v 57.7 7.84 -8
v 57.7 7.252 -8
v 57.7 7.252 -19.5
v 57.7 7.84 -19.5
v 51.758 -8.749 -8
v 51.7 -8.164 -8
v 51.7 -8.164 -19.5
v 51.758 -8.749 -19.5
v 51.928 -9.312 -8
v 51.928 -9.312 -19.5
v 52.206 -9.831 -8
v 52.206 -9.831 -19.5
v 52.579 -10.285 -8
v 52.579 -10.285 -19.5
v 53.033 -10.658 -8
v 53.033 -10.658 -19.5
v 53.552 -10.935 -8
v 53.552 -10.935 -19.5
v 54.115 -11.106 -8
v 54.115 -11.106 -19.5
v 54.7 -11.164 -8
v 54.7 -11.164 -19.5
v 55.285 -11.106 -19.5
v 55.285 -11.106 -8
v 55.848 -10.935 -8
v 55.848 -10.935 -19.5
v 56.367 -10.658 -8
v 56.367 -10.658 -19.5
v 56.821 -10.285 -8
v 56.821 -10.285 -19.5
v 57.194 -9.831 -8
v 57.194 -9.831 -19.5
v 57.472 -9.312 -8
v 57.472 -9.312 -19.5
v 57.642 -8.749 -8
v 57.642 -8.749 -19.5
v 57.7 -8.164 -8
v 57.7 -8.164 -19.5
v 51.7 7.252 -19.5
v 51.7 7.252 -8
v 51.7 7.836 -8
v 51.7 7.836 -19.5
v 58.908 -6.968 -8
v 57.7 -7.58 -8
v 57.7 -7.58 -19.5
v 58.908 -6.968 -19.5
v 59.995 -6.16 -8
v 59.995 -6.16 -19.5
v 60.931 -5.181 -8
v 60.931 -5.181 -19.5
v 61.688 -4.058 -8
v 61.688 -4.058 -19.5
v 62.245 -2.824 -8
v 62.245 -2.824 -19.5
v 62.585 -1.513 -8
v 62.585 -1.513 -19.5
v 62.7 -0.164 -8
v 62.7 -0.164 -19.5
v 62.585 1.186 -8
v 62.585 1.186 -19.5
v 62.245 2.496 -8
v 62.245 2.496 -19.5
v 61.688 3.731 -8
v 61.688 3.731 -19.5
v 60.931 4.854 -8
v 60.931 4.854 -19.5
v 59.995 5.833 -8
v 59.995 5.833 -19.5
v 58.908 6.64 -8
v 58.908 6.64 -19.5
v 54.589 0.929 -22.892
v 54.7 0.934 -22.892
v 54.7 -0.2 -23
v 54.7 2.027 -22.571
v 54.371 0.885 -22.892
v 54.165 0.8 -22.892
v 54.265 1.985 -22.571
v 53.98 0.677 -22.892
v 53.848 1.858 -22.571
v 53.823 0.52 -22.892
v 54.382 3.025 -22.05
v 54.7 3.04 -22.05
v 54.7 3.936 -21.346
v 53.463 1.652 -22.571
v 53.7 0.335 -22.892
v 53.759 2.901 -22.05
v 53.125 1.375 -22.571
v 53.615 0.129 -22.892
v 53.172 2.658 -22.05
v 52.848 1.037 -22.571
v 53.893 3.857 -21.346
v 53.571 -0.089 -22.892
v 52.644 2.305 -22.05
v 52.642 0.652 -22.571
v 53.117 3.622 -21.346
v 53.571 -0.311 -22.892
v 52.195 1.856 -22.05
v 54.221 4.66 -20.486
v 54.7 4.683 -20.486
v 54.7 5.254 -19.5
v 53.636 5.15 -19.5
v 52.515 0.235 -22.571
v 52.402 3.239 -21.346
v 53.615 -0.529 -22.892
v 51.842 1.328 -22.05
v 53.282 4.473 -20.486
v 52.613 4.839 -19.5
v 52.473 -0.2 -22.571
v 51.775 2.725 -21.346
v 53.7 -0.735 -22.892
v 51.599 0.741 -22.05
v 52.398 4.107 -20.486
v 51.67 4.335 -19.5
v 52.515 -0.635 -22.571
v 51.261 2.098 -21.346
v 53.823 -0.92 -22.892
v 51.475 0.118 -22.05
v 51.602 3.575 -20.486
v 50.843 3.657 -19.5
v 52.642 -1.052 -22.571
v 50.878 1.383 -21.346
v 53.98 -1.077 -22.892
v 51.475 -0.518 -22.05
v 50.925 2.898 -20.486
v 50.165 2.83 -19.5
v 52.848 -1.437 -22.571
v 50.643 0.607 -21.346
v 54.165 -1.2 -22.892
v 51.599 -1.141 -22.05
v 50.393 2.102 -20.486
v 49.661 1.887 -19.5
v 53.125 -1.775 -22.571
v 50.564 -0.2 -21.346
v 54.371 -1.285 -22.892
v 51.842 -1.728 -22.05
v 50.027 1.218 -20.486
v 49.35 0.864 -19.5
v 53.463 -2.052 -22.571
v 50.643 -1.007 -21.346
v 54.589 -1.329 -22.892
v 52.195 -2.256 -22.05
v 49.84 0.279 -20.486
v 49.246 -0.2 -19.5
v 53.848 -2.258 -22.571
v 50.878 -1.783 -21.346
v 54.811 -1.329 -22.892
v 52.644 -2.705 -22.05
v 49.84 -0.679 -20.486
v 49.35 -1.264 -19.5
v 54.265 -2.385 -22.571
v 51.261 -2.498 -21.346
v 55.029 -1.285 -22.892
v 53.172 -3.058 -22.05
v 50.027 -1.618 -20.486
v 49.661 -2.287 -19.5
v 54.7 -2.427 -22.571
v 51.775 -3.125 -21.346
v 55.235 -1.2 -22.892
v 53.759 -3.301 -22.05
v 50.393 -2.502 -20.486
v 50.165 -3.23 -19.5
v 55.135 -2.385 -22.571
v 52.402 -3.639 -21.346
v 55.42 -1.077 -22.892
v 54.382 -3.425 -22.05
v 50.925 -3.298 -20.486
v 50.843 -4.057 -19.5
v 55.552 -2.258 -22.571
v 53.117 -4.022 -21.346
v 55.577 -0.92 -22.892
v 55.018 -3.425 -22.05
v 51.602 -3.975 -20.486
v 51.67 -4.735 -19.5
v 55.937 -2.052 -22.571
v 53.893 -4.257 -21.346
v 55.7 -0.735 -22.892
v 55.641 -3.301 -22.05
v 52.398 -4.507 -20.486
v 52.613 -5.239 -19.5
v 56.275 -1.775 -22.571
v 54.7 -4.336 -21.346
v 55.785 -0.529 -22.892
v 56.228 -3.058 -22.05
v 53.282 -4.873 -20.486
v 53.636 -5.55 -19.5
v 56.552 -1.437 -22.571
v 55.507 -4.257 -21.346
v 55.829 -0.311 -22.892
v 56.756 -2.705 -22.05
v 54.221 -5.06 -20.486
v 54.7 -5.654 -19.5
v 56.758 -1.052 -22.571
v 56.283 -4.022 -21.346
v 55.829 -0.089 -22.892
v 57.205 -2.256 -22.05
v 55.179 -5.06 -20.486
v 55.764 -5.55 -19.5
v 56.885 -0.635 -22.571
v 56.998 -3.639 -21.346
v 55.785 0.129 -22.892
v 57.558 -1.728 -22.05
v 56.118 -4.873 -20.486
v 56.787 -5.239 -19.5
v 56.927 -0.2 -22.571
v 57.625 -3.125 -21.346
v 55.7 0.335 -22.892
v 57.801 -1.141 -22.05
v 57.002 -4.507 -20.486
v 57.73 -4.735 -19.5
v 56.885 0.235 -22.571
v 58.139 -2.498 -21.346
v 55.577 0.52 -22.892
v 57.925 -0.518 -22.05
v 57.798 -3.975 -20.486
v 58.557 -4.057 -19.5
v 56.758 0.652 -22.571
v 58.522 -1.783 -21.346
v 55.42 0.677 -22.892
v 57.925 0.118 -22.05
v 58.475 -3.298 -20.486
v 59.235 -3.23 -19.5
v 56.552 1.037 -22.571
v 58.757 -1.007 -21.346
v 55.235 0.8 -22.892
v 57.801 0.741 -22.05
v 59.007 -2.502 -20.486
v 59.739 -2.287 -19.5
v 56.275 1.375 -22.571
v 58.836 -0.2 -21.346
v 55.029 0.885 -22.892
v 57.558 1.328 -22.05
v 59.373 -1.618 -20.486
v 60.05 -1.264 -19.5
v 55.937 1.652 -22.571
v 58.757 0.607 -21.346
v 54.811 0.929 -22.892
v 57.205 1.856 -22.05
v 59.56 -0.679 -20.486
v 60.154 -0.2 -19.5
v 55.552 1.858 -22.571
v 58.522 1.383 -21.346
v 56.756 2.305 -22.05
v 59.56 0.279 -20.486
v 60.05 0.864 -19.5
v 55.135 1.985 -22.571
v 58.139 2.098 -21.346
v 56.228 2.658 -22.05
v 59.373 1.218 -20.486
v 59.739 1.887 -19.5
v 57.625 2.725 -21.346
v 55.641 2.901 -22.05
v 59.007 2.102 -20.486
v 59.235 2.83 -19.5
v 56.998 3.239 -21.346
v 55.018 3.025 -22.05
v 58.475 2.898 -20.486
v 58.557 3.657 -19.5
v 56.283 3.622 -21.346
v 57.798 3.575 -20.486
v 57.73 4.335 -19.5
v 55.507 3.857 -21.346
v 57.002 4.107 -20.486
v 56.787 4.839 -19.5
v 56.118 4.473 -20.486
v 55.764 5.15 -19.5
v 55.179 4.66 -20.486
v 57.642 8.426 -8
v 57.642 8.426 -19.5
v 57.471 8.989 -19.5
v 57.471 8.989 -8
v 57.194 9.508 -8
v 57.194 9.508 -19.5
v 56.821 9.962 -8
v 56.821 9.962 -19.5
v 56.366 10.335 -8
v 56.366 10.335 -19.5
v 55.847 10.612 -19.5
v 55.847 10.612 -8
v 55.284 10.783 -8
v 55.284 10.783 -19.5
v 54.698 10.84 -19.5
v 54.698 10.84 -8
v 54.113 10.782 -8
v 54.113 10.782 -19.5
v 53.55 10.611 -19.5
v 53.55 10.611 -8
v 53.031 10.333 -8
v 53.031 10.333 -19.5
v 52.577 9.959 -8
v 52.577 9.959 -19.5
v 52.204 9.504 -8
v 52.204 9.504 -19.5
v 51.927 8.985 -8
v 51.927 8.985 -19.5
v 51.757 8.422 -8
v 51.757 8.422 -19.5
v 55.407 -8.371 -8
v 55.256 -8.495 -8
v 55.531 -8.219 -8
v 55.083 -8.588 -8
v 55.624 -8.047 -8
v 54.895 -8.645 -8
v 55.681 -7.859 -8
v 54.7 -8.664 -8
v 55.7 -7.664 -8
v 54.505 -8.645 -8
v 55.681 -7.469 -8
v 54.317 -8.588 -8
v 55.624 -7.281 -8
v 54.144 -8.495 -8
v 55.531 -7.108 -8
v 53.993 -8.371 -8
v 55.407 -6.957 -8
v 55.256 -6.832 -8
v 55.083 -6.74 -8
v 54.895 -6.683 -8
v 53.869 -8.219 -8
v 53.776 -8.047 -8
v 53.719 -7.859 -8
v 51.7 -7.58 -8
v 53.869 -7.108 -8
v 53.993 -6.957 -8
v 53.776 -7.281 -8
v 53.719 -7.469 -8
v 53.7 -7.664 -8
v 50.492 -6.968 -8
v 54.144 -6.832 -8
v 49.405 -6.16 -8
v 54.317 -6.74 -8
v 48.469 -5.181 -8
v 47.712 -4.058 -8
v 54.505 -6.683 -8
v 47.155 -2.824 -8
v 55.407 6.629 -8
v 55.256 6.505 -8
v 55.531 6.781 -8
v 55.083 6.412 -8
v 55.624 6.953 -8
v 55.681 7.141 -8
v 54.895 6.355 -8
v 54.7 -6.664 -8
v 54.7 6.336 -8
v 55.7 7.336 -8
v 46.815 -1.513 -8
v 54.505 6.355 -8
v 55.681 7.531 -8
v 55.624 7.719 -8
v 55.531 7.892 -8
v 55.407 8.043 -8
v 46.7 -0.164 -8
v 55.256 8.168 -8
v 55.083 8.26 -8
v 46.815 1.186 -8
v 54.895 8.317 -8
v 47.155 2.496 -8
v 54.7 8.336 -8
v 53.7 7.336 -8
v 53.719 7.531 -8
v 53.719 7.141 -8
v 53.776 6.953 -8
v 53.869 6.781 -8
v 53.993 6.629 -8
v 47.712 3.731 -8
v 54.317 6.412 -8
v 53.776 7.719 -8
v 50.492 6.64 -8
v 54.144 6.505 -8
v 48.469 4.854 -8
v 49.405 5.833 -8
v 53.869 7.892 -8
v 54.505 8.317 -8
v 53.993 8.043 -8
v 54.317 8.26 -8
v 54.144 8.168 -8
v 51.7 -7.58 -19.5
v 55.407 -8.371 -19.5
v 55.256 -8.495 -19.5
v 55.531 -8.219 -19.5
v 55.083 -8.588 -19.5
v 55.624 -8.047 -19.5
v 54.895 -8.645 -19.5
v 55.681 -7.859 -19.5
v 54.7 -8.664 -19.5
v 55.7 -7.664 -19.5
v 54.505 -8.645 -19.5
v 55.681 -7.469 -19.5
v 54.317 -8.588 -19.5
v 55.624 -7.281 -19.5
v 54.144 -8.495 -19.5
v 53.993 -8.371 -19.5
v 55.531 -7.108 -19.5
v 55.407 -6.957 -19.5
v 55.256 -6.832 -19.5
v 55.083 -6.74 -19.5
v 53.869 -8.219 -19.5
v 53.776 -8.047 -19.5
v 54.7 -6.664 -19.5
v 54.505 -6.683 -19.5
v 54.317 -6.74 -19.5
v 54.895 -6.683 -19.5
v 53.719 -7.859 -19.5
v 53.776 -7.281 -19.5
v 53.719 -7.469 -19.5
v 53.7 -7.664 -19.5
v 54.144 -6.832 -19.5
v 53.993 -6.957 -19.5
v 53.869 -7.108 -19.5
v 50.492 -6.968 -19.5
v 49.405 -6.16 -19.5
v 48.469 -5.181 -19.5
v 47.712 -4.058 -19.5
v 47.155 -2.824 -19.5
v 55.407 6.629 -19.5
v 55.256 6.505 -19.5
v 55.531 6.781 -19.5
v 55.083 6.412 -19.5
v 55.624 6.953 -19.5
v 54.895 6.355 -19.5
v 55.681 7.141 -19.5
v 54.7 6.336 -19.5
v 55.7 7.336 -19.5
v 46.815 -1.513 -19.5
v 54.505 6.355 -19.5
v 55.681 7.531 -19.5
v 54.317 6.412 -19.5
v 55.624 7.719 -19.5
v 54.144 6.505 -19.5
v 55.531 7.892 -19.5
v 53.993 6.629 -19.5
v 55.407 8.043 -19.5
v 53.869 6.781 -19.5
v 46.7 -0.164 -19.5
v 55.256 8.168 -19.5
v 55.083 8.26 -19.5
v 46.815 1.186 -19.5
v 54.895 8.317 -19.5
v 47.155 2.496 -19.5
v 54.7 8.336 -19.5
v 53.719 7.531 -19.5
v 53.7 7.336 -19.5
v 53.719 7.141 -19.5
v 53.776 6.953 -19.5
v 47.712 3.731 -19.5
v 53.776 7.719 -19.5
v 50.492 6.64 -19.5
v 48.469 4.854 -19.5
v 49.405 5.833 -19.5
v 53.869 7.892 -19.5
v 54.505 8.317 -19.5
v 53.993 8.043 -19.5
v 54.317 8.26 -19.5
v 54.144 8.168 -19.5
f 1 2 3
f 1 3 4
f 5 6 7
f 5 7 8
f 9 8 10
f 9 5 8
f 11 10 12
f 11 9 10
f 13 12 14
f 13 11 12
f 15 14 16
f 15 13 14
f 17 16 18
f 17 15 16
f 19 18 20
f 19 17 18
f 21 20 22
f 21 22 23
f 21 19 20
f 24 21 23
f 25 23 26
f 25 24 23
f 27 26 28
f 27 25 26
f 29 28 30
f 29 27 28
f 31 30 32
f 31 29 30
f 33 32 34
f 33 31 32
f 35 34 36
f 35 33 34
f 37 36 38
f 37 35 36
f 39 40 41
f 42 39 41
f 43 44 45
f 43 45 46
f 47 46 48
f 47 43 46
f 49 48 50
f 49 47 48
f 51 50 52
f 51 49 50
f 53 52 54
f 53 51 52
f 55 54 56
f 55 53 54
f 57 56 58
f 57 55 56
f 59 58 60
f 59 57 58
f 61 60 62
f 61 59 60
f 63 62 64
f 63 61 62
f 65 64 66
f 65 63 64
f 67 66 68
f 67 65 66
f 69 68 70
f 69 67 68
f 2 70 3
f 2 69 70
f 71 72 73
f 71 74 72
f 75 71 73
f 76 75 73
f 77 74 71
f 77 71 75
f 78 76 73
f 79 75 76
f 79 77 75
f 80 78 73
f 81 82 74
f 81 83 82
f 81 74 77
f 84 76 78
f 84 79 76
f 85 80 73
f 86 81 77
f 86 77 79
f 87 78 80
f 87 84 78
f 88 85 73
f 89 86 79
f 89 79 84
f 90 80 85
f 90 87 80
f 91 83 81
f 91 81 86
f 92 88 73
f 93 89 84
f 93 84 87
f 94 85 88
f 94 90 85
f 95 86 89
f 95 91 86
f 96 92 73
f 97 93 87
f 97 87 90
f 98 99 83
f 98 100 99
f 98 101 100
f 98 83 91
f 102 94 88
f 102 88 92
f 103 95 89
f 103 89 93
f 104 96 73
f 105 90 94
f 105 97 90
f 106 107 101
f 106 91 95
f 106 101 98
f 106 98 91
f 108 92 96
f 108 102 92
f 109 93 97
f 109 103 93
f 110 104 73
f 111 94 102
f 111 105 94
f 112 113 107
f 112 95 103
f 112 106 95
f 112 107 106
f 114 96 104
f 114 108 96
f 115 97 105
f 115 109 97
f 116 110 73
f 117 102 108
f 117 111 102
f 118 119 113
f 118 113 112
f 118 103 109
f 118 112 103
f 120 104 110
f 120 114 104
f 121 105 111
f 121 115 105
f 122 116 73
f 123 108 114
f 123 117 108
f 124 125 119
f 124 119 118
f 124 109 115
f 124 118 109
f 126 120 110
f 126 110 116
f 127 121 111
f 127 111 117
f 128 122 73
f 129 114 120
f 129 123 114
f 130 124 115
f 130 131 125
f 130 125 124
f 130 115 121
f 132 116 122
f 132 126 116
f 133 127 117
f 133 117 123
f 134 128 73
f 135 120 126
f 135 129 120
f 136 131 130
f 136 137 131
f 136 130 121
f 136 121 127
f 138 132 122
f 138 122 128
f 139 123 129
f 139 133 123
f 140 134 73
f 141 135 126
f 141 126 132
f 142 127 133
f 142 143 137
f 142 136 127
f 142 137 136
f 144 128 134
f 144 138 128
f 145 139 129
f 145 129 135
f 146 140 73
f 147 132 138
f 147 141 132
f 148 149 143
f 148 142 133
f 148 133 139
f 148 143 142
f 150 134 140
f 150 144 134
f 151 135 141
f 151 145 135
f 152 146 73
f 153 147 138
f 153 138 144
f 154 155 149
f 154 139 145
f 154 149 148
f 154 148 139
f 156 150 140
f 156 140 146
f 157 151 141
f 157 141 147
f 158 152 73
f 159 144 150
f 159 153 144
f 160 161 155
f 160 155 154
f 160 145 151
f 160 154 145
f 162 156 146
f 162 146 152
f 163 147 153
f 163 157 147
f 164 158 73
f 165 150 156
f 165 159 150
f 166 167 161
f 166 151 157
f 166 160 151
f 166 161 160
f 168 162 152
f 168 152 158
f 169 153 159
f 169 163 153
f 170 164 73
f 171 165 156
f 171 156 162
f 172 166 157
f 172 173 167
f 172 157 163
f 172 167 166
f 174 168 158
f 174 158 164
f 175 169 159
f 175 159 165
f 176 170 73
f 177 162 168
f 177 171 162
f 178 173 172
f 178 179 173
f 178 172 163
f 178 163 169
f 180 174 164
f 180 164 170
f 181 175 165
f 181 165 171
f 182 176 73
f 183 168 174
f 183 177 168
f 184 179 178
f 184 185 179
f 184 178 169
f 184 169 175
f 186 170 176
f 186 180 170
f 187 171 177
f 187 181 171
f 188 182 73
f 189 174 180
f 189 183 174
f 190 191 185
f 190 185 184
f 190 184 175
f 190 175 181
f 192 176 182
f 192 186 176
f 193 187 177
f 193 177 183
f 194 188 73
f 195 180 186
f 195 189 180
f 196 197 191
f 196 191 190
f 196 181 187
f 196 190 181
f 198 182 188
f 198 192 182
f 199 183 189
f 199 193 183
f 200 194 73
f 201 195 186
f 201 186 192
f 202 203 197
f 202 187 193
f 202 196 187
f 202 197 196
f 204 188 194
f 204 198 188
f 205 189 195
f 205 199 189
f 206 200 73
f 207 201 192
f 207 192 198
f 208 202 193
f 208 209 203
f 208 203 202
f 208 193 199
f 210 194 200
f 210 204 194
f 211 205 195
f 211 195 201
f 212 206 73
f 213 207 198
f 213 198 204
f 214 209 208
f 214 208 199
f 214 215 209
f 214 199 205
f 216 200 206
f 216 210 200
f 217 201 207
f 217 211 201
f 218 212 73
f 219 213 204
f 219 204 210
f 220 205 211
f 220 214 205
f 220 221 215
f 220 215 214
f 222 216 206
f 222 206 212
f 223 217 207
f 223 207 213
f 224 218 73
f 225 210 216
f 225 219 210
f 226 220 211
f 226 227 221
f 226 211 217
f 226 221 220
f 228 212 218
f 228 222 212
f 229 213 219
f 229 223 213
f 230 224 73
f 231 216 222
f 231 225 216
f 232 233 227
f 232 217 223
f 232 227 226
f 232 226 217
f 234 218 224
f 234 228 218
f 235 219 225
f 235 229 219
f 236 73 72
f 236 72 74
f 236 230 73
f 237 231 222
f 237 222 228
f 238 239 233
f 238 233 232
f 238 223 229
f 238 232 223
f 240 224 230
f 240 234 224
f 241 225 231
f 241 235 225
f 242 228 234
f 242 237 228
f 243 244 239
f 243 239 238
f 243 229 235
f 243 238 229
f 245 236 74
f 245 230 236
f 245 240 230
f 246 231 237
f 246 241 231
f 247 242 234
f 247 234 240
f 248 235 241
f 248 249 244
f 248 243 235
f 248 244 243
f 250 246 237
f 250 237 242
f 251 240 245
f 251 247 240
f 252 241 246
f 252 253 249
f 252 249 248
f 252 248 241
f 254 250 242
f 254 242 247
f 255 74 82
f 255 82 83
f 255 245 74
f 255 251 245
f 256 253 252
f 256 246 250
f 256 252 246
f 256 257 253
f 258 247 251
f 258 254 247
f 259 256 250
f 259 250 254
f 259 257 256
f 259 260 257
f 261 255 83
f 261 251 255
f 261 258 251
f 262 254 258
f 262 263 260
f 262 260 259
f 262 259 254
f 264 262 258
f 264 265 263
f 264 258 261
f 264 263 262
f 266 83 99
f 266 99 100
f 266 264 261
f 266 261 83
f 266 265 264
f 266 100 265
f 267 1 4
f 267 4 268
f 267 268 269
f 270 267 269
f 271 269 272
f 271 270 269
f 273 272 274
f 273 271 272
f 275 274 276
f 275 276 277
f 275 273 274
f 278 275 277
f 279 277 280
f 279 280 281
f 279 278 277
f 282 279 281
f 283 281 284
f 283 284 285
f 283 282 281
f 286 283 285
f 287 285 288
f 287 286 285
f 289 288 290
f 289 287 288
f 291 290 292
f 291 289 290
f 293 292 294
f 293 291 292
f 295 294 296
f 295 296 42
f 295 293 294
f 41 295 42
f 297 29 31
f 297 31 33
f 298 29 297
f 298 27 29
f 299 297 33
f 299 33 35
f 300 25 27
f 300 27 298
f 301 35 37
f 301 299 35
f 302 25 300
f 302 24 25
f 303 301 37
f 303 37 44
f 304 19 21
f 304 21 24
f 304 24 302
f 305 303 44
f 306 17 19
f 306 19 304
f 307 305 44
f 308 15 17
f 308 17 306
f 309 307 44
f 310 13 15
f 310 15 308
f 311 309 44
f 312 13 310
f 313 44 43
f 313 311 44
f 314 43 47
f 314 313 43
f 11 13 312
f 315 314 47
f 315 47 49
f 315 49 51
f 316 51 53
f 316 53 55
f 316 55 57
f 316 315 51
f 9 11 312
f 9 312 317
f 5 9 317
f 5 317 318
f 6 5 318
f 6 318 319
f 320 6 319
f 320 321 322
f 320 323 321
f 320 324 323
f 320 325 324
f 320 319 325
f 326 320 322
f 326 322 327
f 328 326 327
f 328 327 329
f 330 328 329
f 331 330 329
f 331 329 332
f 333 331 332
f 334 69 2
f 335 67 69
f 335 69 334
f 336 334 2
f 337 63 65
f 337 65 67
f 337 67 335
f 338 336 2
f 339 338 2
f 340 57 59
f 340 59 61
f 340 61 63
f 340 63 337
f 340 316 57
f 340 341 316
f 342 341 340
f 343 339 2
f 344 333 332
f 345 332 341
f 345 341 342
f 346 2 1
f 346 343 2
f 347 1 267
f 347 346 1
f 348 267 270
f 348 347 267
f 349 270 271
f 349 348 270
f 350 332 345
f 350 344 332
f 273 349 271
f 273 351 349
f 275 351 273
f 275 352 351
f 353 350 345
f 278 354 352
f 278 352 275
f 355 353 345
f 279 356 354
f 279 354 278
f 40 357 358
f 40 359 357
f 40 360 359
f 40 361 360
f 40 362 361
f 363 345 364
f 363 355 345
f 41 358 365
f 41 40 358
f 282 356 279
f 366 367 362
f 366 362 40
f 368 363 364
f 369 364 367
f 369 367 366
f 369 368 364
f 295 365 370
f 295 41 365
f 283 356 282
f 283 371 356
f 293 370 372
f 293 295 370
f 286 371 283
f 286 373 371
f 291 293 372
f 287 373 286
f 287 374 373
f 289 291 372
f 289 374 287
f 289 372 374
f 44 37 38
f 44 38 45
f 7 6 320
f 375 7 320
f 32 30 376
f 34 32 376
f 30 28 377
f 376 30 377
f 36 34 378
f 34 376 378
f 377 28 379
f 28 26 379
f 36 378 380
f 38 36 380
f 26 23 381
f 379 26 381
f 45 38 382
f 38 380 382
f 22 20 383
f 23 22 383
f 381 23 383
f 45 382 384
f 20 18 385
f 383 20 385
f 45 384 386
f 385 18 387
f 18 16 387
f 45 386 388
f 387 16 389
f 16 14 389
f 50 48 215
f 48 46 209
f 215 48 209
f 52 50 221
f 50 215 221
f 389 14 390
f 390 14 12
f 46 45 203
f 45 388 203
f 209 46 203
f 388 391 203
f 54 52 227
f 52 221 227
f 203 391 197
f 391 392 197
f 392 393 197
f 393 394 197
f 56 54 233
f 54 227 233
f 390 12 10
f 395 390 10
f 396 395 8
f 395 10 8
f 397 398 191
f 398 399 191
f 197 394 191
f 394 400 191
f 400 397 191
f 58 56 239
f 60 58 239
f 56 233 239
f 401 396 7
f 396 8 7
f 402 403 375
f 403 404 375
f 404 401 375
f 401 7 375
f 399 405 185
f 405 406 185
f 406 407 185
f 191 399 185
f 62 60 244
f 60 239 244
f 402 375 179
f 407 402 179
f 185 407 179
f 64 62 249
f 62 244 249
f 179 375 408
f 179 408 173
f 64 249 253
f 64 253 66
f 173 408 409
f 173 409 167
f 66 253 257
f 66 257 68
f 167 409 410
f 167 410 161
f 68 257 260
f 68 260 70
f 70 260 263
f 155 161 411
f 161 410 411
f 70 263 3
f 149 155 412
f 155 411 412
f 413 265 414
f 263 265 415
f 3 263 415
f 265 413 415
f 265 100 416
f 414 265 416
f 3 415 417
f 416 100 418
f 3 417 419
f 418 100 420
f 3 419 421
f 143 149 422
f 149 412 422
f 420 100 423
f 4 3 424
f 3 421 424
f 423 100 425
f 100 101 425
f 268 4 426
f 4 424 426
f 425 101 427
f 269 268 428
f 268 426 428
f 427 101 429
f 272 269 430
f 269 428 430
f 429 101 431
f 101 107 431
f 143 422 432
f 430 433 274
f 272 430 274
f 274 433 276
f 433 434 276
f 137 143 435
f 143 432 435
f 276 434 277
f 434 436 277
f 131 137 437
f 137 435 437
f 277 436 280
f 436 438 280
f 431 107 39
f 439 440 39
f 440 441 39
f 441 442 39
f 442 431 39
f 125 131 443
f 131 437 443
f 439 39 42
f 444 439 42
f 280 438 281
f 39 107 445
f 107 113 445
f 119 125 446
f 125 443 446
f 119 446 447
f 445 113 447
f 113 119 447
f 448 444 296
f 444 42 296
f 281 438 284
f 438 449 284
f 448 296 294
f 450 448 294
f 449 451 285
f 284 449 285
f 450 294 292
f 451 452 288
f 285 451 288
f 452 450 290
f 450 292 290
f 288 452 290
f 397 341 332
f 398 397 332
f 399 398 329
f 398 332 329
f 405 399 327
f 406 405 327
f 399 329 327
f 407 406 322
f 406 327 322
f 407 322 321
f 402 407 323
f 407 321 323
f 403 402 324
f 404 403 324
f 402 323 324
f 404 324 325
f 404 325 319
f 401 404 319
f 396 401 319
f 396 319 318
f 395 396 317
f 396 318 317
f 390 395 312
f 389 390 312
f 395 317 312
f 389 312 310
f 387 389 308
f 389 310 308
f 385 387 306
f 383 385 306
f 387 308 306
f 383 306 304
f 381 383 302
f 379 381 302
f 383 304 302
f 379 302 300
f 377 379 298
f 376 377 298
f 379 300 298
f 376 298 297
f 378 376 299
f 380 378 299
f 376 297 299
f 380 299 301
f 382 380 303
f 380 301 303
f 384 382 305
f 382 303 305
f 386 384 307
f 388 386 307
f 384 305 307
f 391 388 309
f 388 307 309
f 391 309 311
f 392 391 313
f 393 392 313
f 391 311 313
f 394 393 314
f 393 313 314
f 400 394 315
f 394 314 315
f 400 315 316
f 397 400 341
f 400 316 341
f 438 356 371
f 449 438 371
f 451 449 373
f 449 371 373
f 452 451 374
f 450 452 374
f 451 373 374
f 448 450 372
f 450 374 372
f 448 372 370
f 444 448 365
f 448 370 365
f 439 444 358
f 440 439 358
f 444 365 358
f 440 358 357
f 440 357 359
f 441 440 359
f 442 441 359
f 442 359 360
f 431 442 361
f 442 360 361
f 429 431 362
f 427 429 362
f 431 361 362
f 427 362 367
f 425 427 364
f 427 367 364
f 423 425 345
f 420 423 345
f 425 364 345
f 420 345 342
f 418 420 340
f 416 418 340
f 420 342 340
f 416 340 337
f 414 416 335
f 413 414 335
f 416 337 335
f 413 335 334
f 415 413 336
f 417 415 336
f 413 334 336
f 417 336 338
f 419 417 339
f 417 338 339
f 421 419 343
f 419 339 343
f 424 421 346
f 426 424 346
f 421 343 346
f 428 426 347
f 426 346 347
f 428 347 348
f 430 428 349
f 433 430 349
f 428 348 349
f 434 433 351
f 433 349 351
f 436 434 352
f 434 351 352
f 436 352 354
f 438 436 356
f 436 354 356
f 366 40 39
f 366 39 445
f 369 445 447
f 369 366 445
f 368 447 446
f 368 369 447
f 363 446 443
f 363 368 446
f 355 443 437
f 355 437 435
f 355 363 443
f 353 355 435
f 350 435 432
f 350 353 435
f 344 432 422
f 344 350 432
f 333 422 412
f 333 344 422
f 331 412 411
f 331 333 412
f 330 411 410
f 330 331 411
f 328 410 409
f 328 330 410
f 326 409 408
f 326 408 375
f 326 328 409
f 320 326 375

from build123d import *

# Parameters (mm, degrees)
SKETCH016_R               = 1
PAD014_DEPTH              = 11.5
FUSION006_PLACEMENT_ANGLE = 90


with BuildPart() as sphere:
    # Sphere → Sphere (revolve)
    with BuildSketch(Plane(origin=(56.3, 0, -9), x_dir=(1, 0, 0), z_dir=(0, -1, 0))):
        with BuildLine():
            ThreePointArc((0, -6), (6, 0), (0, 6))
            Line((0, 6), (0, -6))
        make_face()
    revolve(axis=Axis((56.3, 0, -9), (0, 0, 1)))


with BuildPart() as casterwheel:
    # Sketch016 → Pad014 (new body)
    with BuildSketch(Plane.XY):
        with BuildLine():
            ThreePointArc((48.919965, -3), (56.336164, -8), (63.752362, -3))
            Line((63.752362, -3), (64.340191, -3))
            ThreePointArc((64.340191, -3), (67.34019, 0.002014), (64.336164, 2.999997))
            Line((63.752363, 2.999997), (64.336164, 2.999997))
            ThreePointArc((63.752363, 2.999997), (56.336165, 8), (48.919965, 3))
            Line((48.336164, 3), (48.919965, 3))
            ThreePointArc((48.336164, 3), (45.336163, 0), (48.336163, -3))
            Line((48.336163, -3), (48.919965, -3))
        make_face()
        with Locations((48.836164, 0)):
            Circle(SKETCH016_R, mode=Mode.SUBTRACT)
        with Locations((63.836164, 0)):
            Circle(SKETCH016_R, mode=Mode.SUBTRACT)
    extrude(amount=-PAD014_DEPTH)

    # Fusion006: union Sphere
    add(sphere.part)


with BuildPart() as casterwheel_1:
    # Fusion006 placement: moved
    add(casterwheel.part.moved(Location((54.7, -56.5, -8))).rotate(Axis((54.7, -56.5, -8), (0, 0, 1)), FUSION006_PLACEMENT_ANGLE))


solid = casterwheel_1.part
